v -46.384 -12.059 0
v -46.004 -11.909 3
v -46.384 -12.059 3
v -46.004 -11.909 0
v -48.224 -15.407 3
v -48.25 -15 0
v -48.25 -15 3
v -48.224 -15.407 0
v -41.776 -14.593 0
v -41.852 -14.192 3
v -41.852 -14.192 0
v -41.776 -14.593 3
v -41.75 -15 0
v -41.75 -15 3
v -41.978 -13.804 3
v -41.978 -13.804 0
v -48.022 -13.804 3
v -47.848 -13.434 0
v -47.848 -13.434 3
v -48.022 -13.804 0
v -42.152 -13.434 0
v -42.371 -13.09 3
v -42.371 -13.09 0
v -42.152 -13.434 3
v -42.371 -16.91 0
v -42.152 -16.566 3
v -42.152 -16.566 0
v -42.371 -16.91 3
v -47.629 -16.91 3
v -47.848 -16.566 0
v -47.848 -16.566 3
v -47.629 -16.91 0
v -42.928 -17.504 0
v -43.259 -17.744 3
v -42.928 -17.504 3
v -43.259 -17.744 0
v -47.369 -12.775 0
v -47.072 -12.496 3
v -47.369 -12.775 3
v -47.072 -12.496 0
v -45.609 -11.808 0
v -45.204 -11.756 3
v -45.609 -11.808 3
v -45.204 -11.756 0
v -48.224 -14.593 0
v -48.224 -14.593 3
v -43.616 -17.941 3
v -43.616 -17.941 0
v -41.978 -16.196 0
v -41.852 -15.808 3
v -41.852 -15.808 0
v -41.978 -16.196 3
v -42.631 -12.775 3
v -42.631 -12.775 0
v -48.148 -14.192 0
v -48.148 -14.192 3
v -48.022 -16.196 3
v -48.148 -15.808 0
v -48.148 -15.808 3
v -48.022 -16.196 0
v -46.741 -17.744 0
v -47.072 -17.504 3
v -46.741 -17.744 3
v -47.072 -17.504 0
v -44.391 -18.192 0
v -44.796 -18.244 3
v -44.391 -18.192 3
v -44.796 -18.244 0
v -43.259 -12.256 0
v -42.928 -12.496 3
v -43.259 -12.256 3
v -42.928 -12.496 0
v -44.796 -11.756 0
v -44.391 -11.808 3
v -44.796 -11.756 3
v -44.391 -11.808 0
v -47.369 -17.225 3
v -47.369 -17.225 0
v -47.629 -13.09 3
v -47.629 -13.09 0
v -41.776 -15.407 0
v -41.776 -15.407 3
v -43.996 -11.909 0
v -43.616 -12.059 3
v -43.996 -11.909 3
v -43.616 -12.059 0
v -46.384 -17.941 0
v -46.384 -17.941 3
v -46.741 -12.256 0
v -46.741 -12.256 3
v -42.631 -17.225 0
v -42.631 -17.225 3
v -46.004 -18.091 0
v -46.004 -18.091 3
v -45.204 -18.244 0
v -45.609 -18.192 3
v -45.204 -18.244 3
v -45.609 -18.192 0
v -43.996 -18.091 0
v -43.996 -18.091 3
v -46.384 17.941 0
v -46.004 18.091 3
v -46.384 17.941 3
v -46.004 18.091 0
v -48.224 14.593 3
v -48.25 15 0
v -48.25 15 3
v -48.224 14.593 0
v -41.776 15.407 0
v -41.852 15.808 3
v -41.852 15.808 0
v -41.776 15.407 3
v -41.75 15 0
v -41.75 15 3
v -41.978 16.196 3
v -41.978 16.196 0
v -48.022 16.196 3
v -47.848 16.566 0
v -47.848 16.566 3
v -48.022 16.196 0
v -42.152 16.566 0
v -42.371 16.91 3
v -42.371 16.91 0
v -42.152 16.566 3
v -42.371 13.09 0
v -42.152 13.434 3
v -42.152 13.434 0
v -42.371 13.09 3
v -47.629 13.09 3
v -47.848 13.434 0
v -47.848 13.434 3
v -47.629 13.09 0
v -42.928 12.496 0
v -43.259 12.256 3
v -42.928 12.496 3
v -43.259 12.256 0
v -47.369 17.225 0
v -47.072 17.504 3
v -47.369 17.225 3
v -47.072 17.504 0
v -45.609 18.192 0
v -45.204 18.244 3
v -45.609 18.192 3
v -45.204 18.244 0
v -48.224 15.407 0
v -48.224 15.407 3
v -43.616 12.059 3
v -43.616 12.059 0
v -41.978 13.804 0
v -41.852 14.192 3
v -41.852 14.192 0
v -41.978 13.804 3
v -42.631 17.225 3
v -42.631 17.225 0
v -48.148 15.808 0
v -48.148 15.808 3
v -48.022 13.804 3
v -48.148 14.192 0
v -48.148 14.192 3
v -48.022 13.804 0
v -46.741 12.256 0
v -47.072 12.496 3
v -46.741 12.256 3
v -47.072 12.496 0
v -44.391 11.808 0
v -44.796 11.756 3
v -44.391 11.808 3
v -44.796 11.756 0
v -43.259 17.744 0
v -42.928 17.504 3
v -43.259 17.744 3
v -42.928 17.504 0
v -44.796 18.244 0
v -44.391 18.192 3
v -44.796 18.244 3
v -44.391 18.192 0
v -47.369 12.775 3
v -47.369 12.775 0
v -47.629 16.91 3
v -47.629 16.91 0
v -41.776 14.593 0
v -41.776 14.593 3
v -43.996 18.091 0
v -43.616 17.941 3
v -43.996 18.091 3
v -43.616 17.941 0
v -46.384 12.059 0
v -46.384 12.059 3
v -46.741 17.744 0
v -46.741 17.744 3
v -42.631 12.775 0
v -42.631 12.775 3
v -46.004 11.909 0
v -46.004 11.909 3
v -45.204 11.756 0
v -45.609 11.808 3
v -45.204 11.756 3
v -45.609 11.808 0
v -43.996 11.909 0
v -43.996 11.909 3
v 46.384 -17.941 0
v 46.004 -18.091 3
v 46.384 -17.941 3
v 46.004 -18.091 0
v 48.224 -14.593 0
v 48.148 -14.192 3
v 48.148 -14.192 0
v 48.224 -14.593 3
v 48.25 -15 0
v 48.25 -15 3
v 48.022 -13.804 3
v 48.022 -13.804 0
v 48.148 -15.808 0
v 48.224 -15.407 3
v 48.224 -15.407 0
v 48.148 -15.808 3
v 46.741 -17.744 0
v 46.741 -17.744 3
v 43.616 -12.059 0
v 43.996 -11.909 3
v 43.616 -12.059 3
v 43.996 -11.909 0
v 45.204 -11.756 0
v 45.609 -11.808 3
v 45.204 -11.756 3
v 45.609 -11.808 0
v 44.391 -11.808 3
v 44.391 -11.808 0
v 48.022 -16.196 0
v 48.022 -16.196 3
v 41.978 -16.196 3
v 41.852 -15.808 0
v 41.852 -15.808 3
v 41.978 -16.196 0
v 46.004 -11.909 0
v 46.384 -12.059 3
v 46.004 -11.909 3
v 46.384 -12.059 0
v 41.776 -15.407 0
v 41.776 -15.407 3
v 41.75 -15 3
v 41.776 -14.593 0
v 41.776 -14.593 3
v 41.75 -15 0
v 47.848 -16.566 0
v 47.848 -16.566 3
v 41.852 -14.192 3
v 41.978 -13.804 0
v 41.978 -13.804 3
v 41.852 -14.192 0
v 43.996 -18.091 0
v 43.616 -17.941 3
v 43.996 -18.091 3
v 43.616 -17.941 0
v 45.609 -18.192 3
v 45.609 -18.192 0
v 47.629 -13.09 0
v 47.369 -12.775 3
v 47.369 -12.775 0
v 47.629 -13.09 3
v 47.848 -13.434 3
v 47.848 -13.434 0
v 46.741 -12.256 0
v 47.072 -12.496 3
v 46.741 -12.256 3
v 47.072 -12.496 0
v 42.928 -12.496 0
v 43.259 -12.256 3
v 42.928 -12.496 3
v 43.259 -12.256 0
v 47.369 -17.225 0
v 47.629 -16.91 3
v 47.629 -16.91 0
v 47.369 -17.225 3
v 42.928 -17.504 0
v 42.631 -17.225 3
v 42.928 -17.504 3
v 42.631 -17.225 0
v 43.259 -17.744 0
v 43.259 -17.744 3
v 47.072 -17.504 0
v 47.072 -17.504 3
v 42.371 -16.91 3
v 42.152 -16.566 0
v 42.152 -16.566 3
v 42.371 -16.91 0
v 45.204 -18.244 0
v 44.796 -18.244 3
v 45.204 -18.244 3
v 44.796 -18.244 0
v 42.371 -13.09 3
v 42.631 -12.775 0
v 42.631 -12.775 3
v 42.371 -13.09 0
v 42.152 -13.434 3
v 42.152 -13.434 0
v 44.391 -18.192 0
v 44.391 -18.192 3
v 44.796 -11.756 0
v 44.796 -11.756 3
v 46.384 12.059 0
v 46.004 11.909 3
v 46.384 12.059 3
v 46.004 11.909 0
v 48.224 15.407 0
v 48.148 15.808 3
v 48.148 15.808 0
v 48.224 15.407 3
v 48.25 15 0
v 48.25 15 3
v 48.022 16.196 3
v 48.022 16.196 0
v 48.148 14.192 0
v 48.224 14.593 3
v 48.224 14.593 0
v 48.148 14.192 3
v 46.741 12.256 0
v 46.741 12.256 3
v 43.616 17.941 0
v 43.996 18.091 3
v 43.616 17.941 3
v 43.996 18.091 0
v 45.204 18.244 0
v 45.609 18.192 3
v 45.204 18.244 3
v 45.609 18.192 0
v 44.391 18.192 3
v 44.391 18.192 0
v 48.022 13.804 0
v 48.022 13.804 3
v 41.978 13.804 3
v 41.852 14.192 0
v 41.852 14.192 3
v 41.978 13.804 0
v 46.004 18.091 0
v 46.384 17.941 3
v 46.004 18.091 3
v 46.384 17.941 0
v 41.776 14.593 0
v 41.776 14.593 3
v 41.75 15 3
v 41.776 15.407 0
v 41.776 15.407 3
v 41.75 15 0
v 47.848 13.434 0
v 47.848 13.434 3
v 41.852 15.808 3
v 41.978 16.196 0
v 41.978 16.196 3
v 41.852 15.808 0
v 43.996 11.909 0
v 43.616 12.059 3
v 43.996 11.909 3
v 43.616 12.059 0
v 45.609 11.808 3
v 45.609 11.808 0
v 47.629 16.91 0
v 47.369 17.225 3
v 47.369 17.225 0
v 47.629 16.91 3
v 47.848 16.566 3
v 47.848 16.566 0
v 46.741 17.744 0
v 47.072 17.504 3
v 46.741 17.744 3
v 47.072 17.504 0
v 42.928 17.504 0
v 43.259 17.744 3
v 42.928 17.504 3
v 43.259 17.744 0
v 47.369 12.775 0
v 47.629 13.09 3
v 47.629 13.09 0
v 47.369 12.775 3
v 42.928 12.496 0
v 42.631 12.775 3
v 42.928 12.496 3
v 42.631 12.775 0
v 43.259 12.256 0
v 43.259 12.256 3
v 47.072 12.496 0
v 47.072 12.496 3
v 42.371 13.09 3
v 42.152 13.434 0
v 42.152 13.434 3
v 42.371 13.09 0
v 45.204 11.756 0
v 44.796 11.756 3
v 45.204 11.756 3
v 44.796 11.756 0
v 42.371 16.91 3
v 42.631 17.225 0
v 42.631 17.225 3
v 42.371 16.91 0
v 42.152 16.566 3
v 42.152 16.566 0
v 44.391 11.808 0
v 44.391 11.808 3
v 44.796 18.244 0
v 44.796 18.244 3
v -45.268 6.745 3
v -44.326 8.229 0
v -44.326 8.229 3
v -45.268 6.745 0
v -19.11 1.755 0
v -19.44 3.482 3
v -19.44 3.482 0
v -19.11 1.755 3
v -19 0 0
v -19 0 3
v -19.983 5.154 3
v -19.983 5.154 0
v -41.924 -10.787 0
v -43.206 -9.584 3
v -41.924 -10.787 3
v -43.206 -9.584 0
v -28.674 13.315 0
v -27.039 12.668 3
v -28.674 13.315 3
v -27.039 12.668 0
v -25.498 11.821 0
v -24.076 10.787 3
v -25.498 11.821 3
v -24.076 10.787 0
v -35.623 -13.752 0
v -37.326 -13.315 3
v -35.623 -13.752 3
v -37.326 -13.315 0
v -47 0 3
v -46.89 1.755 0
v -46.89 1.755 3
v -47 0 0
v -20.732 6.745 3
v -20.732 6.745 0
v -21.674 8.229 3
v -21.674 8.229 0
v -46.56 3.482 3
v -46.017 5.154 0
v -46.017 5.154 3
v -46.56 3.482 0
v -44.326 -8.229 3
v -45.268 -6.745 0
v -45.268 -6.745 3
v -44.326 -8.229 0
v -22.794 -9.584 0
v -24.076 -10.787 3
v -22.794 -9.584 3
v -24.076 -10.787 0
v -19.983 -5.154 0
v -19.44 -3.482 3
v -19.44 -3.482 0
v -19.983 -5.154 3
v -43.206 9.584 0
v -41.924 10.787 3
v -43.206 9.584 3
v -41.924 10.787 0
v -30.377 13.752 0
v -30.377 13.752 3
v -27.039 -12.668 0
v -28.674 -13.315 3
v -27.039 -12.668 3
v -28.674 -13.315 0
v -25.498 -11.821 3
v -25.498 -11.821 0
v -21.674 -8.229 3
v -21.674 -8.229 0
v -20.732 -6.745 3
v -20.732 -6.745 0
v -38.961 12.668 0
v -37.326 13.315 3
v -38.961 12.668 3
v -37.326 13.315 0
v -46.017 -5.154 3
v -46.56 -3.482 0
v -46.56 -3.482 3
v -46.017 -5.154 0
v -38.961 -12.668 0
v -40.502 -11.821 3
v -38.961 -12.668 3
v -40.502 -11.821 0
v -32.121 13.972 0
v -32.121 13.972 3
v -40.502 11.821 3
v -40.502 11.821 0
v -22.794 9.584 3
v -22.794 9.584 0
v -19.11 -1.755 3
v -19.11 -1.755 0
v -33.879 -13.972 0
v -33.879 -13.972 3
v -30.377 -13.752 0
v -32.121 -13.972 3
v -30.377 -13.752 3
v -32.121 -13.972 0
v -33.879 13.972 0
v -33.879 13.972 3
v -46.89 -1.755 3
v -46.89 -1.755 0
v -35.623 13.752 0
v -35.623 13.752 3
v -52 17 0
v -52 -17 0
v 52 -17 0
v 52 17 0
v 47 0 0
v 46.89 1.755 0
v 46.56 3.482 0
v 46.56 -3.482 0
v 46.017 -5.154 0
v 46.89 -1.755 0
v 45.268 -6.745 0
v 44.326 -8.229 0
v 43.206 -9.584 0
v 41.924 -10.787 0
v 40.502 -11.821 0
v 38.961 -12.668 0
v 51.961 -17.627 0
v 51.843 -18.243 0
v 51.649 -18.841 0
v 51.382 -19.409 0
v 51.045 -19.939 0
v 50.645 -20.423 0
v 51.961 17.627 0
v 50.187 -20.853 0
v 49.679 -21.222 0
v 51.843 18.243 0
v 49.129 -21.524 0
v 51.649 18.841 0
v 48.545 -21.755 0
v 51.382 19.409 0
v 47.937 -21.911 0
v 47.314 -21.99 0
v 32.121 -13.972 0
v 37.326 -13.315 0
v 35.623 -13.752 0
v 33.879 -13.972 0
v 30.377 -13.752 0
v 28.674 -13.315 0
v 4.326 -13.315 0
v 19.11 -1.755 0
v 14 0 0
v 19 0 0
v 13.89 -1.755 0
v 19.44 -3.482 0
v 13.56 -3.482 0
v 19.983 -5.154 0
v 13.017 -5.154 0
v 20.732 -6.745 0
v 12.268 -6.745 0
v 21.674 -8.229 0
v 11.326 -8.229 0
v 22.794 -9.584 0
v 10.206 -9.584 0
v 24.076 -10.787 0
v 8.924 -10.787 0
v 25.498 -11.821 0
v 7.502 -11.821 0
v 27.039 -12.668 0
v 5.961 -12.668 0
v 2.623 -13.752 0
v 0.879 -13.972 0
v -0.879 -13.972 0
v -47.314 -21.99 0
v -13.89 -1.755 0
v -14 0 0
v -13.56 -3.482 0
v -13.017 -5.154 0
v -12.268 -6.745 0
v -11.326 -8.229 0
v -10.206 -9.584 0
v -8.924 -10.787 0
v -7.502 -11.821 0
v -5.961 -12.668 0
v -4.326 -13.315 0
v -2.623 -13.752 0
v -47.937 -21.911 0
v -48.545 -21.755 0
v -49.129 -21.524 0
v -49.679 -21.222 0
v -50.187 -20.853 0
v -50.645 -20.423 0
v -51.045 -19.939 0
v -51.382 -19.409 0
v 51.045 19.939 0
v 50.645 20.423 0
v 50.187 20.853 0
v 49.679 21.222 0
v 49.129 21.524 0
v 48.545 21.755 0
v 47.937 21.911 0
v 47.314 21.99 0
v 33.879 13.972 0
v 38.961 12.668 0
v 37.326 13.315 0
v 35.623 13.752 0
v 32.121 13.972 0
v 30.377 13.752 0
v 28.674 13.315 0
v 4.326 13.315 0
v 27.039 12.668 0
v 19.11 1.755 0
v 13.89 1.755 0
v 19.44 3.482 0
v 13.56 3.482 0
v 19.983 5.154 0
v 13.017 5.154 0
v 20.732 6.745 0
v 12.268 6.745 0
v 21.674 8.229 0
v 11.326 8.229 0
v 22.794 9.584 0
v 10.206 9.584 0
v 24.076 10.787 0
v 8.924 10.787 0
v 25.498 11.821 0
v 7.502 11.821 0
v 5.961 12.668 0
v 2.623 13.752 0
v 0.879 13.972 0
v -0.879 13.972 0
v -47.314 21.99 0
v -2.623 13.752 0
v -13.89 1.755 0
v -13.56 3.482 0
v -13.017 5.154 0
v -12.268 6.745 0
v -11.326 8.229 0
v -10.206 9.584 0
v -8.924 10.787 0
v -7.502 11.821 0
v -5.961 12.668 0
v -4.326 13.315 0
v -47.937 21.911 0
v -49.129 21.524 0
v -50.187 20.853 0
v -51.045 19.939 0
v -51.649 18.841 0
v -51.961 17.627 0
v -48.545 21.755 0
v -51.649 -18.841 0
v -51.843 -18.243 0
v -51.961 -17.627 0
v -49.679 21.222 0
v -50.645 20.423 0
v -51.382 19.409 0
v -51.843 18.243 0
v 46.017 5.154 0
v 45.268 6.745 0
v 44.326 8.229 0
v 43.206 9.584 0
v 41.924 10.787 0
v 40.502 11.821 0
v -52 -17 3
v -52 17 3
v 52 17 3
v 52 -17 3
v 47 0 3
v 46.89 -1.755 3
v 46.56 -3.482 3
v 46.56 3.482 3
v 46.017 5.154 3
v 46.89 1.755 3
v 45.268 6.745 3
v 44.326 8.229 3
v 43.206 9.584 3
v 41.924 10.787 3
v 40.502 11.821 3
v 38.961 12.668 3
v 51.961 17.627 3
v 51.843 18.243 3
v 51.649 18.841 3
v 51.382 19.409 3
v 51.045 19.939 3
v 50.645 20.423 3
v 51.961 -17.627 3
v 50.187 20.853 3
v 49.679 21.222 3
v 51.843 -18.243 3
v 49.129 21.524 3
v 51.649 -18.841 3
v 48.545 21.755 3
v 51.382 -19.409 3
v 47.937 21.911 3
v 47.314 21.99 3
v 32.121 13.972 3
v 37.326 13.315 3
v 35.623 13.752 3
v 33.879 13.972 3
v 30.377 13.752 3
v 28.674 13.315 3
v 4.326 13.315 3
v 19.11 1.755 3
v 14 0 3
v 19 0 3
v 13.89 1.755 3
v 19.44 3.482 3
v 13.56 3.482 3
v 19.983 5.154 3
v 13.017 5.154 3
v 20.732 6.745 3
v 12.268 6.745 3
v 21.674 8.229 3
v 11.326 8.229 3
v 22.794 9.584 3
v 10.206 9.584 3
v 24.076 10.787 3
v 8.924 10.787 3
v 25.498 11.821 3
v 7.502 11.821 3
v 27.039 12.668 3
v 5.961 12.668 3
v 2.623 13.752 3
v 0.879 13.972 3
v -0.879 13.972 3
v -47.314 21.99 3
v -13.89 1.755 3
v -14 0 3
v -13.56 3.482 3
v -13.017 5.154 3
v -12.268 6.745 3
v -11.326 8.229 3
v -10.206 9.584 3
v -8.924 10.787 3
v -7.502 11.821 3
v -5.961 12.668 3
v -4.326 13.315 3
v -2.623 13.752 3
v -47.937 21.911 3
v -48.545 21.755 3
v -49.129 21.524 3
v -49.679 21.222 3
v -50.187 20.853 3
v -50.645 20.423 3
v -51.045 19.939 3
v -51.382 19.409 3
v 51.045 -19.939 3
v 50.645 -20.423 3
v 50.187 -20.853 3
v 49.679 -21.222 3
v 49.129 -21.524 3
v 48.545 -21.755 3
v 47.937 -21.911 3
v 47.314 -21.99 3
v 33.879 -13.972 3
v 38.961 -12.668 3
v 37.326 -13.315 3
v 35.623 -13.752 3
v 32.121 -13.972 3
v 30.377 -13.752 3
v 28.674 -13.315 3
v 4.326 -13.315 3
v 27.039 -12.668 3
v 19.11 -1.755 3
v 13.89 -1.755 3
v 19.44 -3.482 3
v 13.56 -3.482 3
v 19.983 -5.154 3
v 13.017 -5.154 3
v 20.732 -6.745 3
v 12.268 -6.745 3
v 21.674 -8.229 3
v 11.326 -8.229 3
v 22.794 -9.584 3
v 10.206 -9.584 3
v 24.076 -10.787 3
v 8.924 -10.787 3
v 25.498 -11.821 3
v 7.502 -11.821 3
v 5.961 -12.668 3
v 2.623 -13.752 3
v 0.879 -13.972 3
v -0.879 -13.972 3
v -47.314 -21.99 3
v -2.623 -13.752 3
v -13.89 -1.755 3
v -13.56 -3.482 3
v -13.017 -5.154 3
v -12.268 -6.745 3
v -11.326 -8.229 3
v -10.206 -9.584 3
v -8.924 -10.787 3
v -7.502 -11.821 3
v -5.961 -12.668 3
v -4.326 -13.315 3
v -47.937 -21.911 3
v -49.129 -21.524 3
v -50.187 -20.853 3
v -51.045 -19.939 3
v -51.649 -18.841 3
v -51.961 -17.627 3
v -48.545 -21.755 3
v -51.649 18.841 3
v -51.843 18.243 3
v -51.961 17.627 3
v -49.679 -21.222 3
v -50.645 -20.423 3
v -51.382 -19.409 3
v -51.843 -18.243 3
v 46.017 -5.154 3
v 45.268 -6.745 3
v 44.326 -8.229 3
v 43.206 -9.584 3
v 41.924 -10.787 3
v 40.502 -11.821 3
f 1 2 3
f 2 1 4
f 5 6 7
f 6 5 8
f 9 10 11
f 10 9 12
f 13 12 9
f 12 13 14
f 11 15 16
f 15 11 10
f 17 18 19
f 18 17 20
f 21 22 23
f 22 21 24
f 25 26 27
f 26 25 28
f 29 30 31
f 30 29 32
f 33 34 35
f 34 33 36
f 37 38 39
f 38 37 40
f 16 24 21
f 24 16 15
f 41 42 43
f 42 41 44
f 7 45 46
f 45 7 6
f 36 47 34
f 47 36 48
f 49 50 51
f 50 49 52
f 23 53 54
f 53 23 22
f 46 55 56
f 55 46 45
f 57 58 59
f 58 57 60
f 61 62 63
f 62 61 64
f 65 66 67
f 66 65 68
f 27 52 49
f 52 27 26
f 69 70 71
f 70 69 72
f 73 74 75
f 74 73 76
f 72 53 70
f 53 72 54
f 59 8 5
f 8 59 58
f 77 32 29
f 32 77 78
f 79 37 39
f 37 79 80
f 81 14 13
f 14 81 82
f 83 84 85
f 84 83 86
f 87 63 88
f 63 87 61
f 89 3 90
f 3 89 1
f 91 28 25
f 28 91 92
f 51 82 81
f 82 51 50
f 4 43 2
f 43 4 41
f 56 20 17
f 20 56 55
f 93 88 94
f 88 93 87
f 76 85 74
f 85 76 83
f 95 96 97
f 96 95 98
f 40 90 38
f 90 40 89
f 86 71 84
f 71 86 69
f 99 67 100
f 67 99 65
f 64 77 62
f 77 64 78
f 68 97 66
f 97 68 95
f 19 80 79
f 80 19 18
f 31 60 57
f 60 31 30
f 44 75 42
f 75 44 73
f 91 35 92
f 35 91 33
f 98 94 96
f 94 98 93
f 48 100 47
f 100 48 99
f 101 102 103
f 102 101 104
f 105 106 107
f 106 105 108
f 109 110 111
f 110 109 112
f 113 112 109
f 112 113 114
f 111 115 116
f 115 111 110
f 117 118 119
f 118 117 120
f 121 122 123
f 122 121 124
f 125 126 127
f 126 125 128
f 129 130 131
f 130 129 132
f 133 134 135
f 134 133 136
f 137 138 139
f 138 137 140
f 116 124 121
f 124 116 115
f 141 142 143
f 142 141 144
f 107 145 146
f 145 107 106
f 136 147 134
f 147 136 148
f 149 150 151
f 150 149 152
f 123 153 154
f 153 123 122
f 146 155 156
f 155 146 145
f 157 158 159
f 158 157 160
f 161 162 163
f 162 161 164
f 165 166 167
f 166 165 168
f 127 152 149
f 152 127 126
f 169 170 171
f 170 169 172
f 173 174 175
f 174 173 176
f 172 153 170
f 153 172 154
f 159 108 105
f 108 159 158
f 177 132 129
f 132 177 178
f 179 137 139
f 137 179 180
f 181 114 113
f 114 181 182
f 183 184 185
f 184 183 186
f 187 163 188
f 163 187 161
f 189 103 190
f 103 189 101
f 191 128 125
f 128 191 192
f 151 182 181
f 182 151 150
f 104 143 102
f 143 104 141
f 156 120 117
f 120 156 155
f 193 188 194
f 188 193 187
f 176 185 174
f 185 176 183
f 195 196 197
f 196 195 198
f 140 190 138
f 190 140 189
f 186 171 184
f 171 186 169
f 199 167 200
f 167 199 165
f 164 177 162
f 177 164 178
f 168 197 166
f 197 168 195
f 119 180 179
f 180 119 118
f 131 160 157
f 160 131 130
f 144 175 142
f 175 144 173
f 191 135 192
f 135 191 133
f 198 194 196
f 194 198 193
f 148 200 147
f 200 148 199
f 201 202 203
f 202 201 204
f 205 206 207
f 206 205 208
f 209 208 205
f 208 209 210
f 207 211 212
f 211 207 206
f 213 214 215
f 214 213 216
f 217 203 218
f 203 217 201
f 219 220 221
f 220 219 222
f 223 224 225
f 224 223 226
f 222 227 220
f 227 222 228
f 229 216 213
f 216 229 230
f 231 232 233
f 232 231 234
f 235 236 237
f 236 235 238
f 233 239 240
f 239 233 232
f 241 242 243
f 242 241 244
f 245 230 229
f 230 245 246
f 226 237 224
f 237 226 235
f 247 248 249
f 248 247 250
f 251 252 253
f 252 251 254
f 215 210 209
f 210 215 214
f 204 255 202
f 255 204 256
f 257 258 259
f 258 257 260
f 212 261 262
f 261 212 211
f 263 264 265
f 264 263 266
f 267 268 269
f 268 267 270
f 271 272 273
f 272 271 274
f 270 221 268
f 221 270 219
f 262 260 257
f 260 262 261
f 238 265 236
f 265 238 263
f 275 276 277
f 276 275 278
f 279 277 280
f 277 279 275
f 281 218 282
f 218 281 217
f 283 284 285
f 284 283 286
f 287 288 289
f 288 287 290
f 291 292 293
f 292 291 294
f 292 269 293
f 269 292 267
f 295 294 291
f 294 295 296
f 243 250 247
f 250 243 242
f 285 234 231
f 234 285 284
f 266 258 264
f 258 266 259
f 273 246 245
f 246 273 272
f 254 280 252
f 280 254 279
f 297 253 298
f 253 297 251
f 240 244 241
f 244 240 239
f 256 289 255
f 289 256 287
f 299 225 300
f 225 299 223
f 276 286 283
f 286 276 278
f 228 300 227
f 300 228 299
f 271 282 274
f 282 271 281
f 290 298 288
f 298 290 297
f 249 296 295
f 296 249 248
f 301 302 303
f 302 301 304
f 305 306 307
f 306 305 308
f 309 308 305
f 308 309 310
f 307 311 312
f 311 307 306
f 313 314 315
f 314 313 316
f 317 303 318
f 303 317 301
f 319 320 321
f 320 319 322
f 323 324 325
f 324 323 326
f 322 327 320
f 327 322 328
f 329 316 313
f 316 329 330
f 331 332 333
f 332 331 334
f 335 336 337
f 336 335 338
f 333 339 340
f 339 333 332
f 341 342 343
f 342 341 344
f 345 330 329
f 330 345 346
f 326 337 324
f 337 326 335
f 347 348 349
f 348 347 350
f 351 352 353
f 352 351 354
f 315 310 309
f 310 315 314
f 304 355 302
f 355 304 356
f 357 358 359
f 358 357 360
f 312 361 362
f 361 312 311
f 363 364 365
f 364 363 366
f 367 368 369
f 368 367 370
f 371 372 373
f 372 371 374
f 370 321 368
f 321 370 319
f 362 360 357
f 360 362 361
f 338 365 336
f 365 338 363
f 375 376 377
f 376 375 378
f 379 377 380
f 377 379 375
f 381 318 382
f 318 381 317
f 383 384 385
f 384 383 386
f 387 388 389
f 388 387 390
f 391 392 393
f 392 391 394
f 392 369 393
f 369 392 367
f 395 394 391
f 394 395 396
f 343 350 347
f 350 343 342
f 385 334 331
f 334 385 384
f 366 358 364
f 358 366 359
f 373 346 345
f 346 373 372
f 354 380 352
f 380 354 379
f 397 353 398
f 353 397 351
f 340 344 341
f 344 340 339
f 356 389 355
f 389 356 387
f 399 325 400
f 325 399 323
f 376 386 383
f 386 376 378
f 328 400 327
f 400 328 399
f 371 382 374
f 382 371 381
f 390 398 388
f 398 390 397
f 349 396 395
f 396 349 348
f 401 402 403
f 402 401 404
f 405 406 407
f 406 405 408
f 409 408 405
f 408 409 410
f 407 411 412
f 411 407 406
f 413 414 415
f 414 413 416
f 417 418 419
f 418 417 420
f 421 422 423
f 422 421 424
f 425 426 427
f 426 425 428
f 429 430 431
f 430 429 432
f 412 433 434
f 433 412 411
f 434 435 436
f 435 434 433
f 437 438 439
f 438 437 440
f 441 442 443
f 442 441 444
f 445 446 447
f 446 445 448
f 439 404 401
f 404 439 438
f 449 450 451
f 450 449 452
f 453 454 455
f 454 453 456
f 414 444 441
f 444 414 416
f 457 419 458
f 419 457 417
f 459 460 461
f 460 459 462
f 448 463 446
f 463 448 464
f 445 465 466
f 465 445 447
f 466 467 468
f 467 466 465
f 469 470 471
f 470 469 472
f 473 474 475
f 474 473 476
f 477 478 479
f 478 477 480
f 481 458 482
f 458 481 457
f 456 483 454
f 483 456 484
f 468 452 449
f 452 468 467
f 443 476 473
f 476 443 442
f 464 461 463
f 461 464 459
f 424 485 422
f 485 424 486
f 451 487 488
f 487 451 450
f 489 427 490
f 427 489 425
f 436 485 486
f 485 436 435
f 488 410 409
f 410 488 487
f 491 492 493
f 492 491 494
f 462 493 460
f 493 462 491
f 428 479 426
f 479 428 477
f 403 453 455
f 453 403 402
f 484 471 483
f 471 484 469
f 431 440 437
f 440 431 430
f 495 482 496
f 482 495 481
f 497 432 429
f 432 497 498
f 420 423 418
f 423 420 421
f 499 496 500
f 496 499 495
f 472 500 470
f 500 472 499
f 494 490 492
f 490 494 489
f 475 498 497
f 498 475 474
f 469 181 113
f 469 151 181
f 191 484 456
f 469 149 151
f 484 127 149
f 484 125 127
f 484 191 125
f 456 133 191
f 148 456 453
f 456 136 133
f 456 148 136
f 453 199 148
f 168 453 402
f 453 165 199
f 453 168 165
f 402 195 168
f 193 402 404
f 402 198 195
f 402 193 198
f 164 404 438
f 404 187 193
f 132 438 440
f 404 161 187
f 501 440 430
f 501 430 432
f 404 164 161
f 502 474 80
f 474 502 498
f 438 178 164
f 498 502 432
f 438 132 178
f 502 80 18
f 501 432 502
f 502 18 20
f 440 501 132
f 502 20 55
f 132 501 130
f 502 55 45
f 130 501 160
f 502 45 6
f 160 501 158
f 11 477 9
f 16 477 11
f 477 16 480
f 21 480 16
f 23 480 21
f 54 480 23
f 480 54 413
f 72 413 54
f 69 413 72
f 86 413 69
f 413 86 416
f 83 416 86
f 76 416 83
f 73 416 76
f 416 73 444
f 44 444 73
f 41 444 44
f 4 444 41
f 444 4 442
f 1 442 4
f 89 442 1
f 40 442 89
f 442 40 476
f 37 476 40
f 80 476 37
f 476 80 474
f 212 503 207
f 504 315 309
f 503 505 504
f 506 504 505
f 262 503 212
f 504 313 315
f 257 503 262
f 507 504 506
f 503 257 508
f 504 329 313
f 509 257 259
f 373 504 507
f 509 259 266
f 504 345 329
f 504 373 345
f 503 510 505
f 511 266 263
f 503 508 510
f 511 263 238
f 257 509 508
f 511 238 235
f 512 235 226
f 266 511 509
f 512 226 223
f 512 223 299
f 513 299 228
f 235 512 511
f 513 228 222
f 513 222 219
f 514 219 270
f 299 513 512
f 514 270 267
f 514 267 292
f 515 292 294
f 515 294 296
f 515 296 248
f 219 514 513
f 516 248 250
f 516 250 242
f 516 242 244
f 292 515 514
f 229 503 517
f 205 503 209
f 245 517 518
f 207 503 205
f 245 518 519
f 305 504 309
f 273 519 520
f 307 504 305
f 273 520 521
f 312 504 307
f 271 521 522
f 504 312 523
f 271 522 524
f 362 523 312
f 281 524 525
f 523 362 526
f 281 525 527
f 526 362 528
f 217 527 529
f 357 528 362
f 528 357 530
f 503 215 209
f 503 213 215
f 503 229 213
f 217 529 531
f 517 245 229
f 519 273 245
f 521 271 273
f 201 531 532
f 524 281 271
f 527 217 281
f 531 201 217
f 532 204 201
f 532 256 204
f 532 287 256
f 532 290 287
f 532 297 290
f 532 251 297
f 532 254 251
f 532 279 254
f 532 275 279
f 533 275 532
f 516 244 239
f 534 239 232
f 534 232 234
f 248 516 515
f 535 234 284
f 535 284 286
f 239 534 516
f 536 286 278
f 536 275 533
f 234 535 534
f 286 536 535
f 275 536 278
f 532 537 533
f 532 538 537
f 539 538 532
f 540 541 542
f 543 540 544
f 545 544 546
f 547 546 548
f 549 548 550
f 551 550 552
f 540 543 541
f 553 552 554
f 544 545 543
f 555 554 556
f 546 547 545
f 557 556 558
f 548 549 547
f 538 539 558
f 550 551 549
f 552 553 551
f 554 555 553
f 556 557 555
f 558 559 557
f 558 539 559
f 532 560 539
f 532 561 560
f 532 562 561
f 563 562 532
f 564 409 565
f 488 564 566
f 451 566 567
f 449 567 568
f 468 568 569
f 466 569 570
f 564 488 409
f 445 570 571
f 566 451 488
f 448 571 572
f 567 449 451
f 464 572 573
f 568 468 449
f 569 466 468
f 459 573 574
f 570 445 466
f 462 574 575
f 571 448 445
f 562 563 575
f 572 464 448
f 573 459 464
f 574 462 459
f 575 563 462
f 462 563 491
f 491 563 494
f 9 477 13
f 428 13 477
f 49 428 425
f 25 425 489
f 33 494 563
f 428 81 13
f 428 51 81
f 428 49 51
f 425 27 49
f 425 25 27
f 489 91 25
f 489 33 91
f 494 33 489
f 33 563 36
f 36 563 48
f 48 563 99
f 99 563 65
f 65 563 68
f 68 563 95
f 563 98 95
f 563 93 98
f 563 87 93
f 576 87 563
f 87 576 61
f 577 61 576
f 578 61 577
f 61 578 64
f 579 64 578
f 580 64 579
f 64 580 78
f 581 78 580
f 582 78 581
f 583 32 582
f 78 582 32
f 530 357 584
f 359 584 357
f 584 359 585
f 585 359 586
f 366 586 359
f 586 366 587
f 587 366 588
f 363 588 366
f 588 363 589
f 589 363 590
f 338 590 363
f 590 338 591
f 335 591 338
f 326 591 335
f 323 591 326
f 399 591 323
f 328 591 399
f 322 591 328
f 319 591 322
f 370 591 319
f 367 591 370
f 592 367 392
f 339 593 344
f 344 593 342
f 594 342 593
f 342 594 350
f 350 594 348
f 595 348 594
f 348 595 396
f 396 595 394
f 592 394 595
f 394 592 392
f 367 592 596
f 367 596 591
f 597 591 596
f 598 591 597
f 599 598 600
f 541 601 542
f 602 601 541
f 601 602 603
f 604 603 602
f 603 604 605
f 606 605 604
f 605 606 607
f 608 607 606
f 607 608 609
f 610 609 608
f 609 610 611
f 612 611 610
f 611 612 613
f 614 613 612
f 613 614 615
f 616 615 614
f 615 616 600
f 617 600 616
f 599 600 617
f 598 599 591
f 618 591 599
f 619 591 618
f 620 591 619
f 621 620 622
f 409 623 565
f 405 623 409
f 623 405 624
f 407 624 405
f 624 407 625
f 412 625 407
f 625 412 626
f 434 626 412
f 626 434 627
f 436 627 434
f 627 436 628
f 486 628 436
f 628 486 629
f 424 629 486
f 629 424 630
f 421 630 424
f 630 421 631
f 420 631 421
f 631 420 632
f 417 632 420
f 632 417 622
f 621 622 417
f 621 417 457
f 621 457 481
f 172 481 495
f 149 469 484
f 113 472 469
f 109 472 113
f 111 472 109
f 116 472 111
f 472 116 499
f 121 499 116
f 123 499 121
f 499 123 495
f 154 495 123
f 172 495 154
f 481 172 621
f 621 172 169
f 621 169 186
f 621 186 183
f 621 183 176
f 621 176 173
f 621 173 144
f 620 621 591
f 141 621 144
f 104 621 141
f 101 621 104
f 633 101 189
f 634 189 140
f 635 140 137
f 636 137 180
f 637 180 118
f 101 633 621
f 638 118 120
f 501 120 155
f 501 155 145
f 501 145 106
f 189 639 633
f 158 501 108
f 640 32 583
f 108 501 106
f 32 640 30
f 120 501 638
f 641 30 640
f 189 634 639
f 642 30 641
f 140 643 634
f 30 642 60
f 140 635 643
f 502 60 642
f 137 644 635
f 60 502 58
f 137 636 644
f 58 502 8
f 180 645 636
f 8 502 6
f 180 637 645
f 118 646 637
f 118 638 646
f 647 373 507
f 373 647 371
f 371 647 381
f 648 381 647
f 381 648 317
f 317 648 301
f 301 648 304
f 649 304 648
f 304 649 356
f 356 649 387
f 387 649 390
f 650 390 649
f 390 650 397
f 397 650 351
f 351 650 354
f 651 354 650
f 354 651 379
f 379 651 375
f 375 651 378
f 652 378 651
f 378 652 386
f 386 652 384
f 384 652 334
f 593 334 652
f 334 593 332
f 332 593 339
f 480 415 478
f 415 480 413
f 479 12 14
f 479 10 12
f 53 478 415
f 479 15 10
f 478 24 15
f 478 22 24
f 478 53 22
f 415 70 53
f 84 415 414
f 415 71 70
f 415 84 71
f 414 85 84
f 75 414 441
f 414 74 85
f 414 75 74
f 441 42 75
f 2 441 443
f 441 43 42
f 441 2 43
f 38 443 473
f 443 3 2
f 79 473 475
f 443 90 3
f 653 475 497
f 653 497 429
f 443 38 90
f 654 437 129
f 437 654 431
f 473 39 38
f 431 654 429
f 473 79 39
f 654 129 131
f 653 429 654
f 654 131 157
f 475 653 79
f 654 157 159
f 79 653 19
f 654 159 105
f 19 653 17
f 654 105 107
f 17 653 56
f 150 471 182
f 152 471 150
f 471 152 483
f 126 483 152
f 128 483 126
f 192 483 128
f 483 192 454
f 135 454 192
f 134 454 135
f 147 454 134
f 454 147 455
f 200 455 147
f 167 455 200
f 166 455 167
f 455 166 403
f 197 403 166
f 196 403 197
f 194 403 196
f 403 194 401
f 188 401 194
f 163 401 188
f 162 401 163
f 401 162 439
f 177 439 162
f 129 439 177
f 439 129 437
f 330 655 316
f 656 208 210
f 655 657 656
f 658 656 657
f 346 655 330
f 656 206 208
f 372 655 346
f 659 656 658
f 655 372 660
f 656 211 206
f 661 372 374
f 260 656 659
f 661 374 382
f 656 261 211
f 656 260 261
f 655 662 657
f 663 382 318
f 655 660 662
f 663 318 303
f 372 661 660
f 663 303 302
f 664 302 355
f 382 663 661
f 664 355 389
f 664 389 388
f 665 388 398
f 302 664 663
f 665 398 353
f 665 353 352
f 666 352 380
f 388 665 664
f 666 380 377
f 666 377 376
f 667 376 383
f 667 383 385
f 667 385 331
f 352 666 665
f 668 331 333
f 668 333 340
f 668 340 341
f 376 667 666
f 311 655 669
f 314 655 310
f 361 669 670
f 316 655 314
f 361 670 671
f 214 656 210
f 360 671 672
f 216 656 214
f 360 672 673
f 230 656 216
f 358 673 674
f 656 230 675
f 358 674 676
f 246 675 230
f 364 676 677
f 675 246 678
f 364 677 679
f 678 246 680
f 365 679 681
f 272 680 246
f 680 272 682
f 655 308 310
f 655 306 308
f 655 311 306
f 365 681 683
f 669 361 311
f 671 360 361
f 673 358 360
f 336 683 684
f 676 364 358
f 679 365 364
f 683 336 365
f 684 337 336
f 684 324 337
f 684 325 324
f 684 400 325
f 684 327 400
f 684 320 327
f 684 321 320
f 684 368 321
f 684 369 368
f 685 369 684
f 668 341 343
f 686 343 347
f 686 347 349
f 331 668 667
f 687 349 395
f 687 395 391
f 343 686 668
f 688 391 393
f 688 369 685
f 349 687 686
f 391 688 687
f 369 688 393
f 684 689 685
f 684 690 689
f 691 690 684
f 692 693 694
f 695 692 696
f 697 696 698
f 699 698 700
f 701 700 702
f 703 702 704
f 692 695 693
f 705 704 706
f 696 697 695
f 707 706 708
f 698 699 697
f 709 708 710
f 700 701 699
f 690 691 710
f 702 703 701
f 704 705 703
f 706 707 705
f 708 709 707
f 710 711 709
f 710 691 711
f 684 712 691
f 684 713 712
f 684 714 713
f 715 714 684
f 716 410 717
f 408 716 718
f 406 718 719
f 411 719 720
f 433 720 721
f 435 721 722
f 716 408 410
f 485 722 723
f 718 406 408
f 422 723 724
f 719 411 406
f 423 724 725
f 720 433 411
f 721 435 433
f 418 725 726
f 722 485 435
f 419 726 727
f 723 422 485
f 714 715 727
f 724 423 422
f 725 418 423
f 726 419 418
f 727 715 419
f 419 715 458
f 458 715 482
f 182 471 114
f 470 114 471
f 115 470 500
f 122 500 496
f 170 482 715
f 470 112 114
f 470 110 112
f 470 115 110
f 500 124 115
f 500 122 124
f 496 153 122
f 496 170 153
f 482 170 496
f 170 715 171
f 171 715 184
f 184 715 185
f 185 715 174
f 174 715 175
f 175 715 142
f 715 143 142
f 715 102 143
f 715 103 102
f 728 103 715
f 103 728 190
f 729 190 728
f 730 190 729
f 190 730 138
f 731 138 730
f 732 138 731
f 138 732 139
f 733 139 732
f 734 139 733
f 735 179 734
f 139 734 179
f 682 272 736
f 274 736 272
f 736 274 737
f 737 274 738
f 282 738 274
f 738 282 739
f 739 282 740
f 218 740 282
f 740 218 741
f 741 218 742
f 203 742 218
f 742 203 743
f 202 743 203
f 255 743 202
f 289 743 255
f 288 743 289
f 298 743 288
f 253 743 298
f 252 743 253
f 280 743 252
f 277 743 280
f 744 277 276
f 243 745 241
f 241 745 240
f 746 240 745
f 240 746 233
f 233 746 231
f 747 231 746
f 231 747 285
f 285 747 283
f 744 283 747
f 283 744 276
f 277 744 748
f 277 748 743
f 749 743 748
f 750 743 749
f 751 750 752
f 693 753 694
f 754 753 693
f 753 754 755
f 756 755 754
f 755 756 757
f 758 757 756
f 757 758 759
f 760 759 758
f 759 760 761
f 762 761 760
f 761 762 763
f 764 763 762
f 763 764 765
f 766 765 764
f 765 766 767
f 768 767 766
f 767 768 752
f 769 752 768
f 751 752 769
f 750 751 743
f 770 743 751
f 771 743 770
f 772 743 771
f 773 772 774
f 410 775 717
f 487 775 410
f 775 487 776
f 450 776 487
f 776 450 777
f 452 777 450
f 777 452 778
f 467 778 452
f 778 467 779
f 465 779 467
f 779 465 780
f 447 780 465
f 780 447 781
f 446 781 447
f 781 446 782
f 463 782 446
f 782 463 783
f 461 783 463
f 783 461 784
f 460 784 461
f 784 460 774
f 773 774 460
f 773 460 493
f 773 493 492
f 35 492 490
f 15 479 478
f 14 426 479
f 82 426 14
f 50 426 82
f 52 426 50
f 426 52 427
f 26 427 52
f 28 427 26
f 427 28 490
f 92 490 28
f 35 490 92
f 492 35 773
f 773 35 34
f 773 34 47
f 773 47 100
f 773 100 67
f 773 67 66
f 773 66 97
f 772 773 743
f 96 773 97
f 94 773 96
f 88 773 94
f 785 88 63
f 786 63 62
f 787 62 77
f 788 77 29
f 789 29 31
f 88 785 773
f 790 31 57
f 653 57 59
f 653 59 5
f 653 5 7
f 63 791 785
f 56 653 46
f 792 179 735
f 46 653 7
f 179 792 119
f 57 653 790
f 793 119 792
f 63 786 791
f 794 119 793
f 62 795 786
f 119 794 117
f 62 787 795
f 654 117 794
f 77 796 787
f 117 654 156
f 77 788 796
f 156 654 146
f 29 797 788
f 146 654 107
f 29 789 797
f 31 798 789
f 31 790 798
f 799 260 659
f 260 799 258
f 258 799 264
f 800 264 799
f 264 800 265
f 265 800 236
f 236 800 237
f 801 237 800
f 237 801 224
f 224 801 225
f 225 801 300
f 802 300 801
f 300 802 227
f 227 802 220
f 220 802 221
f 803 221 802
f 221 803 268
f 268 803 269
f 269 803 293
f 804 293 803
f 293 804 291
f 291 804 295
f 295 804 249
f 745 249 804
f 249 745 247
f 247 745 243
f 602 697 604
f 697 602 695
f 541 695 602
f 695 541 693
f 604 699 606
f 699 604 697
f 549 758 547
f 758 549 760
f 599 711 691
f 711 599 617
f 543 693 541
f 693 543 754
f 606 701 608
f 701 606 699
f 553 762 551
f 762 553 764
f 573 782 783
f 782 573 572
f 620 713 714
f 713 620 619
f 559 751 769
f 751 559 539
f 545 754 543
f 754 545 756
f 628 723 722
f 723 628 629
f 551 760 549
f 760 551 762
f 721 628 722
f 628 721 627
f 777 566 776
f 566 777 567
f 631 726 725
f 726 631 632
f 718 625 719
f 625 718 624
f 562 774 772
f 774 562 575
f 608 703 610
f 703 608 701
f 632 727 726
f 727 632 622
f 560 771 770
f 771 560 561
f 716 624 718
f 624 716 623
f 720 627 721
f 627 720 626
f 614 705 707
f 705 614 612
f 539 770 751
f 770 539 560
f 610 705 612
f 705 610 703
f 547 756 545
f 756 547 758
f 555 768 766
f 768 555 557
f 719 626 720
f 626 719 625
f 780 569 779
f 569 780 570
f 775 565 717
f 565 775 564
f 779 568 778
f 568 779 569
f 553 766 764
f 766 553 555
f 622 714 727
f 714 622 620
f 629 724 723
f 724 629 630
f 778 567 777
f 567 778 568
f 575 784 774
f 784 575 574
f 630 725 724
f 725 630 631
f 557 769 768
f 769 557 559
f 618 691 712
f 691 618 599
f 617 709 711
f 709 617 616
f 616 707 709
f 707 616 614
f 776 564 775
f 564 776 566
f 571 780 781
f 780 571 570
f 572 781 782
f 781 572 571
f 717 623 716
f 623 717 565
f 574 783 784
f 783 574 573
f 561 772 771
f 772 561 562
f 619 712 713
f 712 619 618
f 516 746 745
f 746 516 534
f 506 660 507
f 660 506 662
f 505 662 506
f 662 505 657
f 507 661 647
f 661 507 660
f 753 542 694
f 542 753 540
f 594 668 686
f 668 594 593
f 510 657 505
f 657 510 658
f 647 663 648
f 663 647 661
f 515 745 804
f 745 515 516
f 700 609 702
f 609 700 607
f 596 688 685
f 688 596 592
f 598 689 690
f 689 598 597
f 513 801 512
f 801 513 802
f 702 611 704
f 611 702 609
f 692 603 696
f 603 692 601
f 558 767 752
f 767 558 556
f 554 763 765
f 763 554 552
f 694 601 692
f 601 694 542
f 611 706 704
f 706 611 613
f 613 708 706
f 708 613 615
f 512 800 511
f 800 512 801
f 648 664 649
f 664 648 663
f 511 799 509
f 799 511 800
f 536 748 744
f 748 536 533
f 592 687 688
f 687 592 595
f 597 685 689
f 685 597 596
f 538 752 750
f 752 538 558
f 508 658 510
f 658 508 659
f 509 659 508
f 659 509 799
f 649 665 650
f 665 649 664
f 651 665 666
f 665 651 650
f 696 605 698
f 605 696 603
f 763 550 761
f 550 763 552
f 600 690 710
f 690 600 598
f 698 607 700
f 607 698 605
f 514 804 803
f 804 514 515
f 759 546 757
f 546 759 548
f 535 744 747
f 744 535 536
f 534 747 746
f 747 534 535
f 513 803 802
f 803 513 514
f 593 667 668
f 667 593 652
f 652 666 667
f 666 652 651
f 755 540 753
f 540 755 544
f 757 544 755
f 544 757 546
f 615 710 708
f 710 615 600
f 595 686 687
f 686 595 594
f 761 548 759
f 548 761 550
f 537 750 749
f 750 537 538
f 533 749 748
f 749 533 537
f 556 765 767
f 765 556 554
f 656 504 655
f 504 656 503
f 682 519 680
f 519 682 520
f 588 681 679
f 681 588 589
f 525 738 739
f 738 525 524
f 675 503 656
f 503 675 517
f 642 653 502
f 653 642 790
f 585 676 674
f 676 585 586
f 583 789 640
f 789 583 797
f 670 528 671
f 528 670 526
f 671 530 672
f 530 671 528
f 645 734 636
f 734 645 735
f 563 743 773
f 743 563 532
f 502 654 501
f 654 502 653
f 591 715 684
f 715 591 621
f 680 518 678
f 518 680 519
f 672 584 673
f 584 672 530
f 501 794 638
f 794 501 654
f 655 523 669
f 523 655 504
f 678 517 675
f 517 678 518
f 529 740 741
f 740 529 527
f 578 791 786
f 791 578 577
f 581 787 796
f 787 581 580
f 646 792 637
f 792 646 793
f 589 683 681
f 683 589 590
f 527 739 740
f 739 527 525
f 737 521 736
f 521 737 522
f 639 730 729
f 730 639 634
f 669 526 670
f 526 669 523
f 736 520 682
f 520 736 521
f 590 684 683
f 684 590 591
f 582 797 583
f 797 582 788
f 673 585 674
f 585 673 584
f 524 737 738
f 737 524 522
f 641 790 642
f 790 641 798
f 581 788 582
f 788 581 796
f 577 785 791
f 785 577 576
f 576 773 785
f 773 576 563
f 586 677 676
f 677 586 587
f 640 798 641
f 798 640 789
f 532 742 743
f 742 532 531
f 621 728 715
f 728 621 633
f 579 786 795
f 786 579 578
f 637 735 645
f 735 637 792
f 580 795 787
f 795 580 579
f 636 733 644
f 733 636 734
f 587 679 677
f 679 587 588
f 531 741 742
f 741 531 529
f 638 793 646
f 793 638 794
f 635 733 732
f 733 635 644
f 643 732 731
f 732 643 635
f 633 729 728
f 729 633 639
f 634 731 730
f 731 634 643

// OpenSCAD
$fn = 50;


difference() {
	union() {
		hull() {
			translate(v = [-47.0000000000, 17.0000000000, 0]) {
				cylinder(h = 3, r = 5);
			}
			translate(v = [47.0000000000, 17.0000000000, 0]) {
				cylinder(h = 3, r = 5);
			}
			translate(v = [-47.0000000000, -17.0000000000, 0]) {
				cylinder(h = 3, r = 5);
			}
			translate(v = [47.0000000000, -17.0000000000, 0]) {
				cylinder(h = 3, r = 5);
			}
		}
	}
	union() {
		#translate(v = [-45.0000000000, -15.0000000000, -100.0000000000]) {
			cylinder(h = 200, r = 3.2500000000);
		}
		#translate(v = [-45.0000000000, 15.0000000000, -100.0000000000]) {
			cylinder(h = 200, r = 3.2500000000);
		}
		#translate(v = [45.0000000000, -15.0000000000, -100.0000000000]) {
			cylinder(h = 200, r = 3.2500000000);
		}
		#translate(v = [45.0000000000, 15.0000000000, -100.0000000000]) {
			cylinder(h = 200, r = 3.2500000000);
		}
		#translate(v = [-33.0000000000, 0, 0]) {
			cylinder(h = 3, r = 14.0000000000);
		}
		#cylinder(h = 3, r = 14.0000000000);
		#translate(v = [33.0000000000, 0, 0]) {
			cylinder(h = 3, r = 14.0000000000);
		}
	}
}
